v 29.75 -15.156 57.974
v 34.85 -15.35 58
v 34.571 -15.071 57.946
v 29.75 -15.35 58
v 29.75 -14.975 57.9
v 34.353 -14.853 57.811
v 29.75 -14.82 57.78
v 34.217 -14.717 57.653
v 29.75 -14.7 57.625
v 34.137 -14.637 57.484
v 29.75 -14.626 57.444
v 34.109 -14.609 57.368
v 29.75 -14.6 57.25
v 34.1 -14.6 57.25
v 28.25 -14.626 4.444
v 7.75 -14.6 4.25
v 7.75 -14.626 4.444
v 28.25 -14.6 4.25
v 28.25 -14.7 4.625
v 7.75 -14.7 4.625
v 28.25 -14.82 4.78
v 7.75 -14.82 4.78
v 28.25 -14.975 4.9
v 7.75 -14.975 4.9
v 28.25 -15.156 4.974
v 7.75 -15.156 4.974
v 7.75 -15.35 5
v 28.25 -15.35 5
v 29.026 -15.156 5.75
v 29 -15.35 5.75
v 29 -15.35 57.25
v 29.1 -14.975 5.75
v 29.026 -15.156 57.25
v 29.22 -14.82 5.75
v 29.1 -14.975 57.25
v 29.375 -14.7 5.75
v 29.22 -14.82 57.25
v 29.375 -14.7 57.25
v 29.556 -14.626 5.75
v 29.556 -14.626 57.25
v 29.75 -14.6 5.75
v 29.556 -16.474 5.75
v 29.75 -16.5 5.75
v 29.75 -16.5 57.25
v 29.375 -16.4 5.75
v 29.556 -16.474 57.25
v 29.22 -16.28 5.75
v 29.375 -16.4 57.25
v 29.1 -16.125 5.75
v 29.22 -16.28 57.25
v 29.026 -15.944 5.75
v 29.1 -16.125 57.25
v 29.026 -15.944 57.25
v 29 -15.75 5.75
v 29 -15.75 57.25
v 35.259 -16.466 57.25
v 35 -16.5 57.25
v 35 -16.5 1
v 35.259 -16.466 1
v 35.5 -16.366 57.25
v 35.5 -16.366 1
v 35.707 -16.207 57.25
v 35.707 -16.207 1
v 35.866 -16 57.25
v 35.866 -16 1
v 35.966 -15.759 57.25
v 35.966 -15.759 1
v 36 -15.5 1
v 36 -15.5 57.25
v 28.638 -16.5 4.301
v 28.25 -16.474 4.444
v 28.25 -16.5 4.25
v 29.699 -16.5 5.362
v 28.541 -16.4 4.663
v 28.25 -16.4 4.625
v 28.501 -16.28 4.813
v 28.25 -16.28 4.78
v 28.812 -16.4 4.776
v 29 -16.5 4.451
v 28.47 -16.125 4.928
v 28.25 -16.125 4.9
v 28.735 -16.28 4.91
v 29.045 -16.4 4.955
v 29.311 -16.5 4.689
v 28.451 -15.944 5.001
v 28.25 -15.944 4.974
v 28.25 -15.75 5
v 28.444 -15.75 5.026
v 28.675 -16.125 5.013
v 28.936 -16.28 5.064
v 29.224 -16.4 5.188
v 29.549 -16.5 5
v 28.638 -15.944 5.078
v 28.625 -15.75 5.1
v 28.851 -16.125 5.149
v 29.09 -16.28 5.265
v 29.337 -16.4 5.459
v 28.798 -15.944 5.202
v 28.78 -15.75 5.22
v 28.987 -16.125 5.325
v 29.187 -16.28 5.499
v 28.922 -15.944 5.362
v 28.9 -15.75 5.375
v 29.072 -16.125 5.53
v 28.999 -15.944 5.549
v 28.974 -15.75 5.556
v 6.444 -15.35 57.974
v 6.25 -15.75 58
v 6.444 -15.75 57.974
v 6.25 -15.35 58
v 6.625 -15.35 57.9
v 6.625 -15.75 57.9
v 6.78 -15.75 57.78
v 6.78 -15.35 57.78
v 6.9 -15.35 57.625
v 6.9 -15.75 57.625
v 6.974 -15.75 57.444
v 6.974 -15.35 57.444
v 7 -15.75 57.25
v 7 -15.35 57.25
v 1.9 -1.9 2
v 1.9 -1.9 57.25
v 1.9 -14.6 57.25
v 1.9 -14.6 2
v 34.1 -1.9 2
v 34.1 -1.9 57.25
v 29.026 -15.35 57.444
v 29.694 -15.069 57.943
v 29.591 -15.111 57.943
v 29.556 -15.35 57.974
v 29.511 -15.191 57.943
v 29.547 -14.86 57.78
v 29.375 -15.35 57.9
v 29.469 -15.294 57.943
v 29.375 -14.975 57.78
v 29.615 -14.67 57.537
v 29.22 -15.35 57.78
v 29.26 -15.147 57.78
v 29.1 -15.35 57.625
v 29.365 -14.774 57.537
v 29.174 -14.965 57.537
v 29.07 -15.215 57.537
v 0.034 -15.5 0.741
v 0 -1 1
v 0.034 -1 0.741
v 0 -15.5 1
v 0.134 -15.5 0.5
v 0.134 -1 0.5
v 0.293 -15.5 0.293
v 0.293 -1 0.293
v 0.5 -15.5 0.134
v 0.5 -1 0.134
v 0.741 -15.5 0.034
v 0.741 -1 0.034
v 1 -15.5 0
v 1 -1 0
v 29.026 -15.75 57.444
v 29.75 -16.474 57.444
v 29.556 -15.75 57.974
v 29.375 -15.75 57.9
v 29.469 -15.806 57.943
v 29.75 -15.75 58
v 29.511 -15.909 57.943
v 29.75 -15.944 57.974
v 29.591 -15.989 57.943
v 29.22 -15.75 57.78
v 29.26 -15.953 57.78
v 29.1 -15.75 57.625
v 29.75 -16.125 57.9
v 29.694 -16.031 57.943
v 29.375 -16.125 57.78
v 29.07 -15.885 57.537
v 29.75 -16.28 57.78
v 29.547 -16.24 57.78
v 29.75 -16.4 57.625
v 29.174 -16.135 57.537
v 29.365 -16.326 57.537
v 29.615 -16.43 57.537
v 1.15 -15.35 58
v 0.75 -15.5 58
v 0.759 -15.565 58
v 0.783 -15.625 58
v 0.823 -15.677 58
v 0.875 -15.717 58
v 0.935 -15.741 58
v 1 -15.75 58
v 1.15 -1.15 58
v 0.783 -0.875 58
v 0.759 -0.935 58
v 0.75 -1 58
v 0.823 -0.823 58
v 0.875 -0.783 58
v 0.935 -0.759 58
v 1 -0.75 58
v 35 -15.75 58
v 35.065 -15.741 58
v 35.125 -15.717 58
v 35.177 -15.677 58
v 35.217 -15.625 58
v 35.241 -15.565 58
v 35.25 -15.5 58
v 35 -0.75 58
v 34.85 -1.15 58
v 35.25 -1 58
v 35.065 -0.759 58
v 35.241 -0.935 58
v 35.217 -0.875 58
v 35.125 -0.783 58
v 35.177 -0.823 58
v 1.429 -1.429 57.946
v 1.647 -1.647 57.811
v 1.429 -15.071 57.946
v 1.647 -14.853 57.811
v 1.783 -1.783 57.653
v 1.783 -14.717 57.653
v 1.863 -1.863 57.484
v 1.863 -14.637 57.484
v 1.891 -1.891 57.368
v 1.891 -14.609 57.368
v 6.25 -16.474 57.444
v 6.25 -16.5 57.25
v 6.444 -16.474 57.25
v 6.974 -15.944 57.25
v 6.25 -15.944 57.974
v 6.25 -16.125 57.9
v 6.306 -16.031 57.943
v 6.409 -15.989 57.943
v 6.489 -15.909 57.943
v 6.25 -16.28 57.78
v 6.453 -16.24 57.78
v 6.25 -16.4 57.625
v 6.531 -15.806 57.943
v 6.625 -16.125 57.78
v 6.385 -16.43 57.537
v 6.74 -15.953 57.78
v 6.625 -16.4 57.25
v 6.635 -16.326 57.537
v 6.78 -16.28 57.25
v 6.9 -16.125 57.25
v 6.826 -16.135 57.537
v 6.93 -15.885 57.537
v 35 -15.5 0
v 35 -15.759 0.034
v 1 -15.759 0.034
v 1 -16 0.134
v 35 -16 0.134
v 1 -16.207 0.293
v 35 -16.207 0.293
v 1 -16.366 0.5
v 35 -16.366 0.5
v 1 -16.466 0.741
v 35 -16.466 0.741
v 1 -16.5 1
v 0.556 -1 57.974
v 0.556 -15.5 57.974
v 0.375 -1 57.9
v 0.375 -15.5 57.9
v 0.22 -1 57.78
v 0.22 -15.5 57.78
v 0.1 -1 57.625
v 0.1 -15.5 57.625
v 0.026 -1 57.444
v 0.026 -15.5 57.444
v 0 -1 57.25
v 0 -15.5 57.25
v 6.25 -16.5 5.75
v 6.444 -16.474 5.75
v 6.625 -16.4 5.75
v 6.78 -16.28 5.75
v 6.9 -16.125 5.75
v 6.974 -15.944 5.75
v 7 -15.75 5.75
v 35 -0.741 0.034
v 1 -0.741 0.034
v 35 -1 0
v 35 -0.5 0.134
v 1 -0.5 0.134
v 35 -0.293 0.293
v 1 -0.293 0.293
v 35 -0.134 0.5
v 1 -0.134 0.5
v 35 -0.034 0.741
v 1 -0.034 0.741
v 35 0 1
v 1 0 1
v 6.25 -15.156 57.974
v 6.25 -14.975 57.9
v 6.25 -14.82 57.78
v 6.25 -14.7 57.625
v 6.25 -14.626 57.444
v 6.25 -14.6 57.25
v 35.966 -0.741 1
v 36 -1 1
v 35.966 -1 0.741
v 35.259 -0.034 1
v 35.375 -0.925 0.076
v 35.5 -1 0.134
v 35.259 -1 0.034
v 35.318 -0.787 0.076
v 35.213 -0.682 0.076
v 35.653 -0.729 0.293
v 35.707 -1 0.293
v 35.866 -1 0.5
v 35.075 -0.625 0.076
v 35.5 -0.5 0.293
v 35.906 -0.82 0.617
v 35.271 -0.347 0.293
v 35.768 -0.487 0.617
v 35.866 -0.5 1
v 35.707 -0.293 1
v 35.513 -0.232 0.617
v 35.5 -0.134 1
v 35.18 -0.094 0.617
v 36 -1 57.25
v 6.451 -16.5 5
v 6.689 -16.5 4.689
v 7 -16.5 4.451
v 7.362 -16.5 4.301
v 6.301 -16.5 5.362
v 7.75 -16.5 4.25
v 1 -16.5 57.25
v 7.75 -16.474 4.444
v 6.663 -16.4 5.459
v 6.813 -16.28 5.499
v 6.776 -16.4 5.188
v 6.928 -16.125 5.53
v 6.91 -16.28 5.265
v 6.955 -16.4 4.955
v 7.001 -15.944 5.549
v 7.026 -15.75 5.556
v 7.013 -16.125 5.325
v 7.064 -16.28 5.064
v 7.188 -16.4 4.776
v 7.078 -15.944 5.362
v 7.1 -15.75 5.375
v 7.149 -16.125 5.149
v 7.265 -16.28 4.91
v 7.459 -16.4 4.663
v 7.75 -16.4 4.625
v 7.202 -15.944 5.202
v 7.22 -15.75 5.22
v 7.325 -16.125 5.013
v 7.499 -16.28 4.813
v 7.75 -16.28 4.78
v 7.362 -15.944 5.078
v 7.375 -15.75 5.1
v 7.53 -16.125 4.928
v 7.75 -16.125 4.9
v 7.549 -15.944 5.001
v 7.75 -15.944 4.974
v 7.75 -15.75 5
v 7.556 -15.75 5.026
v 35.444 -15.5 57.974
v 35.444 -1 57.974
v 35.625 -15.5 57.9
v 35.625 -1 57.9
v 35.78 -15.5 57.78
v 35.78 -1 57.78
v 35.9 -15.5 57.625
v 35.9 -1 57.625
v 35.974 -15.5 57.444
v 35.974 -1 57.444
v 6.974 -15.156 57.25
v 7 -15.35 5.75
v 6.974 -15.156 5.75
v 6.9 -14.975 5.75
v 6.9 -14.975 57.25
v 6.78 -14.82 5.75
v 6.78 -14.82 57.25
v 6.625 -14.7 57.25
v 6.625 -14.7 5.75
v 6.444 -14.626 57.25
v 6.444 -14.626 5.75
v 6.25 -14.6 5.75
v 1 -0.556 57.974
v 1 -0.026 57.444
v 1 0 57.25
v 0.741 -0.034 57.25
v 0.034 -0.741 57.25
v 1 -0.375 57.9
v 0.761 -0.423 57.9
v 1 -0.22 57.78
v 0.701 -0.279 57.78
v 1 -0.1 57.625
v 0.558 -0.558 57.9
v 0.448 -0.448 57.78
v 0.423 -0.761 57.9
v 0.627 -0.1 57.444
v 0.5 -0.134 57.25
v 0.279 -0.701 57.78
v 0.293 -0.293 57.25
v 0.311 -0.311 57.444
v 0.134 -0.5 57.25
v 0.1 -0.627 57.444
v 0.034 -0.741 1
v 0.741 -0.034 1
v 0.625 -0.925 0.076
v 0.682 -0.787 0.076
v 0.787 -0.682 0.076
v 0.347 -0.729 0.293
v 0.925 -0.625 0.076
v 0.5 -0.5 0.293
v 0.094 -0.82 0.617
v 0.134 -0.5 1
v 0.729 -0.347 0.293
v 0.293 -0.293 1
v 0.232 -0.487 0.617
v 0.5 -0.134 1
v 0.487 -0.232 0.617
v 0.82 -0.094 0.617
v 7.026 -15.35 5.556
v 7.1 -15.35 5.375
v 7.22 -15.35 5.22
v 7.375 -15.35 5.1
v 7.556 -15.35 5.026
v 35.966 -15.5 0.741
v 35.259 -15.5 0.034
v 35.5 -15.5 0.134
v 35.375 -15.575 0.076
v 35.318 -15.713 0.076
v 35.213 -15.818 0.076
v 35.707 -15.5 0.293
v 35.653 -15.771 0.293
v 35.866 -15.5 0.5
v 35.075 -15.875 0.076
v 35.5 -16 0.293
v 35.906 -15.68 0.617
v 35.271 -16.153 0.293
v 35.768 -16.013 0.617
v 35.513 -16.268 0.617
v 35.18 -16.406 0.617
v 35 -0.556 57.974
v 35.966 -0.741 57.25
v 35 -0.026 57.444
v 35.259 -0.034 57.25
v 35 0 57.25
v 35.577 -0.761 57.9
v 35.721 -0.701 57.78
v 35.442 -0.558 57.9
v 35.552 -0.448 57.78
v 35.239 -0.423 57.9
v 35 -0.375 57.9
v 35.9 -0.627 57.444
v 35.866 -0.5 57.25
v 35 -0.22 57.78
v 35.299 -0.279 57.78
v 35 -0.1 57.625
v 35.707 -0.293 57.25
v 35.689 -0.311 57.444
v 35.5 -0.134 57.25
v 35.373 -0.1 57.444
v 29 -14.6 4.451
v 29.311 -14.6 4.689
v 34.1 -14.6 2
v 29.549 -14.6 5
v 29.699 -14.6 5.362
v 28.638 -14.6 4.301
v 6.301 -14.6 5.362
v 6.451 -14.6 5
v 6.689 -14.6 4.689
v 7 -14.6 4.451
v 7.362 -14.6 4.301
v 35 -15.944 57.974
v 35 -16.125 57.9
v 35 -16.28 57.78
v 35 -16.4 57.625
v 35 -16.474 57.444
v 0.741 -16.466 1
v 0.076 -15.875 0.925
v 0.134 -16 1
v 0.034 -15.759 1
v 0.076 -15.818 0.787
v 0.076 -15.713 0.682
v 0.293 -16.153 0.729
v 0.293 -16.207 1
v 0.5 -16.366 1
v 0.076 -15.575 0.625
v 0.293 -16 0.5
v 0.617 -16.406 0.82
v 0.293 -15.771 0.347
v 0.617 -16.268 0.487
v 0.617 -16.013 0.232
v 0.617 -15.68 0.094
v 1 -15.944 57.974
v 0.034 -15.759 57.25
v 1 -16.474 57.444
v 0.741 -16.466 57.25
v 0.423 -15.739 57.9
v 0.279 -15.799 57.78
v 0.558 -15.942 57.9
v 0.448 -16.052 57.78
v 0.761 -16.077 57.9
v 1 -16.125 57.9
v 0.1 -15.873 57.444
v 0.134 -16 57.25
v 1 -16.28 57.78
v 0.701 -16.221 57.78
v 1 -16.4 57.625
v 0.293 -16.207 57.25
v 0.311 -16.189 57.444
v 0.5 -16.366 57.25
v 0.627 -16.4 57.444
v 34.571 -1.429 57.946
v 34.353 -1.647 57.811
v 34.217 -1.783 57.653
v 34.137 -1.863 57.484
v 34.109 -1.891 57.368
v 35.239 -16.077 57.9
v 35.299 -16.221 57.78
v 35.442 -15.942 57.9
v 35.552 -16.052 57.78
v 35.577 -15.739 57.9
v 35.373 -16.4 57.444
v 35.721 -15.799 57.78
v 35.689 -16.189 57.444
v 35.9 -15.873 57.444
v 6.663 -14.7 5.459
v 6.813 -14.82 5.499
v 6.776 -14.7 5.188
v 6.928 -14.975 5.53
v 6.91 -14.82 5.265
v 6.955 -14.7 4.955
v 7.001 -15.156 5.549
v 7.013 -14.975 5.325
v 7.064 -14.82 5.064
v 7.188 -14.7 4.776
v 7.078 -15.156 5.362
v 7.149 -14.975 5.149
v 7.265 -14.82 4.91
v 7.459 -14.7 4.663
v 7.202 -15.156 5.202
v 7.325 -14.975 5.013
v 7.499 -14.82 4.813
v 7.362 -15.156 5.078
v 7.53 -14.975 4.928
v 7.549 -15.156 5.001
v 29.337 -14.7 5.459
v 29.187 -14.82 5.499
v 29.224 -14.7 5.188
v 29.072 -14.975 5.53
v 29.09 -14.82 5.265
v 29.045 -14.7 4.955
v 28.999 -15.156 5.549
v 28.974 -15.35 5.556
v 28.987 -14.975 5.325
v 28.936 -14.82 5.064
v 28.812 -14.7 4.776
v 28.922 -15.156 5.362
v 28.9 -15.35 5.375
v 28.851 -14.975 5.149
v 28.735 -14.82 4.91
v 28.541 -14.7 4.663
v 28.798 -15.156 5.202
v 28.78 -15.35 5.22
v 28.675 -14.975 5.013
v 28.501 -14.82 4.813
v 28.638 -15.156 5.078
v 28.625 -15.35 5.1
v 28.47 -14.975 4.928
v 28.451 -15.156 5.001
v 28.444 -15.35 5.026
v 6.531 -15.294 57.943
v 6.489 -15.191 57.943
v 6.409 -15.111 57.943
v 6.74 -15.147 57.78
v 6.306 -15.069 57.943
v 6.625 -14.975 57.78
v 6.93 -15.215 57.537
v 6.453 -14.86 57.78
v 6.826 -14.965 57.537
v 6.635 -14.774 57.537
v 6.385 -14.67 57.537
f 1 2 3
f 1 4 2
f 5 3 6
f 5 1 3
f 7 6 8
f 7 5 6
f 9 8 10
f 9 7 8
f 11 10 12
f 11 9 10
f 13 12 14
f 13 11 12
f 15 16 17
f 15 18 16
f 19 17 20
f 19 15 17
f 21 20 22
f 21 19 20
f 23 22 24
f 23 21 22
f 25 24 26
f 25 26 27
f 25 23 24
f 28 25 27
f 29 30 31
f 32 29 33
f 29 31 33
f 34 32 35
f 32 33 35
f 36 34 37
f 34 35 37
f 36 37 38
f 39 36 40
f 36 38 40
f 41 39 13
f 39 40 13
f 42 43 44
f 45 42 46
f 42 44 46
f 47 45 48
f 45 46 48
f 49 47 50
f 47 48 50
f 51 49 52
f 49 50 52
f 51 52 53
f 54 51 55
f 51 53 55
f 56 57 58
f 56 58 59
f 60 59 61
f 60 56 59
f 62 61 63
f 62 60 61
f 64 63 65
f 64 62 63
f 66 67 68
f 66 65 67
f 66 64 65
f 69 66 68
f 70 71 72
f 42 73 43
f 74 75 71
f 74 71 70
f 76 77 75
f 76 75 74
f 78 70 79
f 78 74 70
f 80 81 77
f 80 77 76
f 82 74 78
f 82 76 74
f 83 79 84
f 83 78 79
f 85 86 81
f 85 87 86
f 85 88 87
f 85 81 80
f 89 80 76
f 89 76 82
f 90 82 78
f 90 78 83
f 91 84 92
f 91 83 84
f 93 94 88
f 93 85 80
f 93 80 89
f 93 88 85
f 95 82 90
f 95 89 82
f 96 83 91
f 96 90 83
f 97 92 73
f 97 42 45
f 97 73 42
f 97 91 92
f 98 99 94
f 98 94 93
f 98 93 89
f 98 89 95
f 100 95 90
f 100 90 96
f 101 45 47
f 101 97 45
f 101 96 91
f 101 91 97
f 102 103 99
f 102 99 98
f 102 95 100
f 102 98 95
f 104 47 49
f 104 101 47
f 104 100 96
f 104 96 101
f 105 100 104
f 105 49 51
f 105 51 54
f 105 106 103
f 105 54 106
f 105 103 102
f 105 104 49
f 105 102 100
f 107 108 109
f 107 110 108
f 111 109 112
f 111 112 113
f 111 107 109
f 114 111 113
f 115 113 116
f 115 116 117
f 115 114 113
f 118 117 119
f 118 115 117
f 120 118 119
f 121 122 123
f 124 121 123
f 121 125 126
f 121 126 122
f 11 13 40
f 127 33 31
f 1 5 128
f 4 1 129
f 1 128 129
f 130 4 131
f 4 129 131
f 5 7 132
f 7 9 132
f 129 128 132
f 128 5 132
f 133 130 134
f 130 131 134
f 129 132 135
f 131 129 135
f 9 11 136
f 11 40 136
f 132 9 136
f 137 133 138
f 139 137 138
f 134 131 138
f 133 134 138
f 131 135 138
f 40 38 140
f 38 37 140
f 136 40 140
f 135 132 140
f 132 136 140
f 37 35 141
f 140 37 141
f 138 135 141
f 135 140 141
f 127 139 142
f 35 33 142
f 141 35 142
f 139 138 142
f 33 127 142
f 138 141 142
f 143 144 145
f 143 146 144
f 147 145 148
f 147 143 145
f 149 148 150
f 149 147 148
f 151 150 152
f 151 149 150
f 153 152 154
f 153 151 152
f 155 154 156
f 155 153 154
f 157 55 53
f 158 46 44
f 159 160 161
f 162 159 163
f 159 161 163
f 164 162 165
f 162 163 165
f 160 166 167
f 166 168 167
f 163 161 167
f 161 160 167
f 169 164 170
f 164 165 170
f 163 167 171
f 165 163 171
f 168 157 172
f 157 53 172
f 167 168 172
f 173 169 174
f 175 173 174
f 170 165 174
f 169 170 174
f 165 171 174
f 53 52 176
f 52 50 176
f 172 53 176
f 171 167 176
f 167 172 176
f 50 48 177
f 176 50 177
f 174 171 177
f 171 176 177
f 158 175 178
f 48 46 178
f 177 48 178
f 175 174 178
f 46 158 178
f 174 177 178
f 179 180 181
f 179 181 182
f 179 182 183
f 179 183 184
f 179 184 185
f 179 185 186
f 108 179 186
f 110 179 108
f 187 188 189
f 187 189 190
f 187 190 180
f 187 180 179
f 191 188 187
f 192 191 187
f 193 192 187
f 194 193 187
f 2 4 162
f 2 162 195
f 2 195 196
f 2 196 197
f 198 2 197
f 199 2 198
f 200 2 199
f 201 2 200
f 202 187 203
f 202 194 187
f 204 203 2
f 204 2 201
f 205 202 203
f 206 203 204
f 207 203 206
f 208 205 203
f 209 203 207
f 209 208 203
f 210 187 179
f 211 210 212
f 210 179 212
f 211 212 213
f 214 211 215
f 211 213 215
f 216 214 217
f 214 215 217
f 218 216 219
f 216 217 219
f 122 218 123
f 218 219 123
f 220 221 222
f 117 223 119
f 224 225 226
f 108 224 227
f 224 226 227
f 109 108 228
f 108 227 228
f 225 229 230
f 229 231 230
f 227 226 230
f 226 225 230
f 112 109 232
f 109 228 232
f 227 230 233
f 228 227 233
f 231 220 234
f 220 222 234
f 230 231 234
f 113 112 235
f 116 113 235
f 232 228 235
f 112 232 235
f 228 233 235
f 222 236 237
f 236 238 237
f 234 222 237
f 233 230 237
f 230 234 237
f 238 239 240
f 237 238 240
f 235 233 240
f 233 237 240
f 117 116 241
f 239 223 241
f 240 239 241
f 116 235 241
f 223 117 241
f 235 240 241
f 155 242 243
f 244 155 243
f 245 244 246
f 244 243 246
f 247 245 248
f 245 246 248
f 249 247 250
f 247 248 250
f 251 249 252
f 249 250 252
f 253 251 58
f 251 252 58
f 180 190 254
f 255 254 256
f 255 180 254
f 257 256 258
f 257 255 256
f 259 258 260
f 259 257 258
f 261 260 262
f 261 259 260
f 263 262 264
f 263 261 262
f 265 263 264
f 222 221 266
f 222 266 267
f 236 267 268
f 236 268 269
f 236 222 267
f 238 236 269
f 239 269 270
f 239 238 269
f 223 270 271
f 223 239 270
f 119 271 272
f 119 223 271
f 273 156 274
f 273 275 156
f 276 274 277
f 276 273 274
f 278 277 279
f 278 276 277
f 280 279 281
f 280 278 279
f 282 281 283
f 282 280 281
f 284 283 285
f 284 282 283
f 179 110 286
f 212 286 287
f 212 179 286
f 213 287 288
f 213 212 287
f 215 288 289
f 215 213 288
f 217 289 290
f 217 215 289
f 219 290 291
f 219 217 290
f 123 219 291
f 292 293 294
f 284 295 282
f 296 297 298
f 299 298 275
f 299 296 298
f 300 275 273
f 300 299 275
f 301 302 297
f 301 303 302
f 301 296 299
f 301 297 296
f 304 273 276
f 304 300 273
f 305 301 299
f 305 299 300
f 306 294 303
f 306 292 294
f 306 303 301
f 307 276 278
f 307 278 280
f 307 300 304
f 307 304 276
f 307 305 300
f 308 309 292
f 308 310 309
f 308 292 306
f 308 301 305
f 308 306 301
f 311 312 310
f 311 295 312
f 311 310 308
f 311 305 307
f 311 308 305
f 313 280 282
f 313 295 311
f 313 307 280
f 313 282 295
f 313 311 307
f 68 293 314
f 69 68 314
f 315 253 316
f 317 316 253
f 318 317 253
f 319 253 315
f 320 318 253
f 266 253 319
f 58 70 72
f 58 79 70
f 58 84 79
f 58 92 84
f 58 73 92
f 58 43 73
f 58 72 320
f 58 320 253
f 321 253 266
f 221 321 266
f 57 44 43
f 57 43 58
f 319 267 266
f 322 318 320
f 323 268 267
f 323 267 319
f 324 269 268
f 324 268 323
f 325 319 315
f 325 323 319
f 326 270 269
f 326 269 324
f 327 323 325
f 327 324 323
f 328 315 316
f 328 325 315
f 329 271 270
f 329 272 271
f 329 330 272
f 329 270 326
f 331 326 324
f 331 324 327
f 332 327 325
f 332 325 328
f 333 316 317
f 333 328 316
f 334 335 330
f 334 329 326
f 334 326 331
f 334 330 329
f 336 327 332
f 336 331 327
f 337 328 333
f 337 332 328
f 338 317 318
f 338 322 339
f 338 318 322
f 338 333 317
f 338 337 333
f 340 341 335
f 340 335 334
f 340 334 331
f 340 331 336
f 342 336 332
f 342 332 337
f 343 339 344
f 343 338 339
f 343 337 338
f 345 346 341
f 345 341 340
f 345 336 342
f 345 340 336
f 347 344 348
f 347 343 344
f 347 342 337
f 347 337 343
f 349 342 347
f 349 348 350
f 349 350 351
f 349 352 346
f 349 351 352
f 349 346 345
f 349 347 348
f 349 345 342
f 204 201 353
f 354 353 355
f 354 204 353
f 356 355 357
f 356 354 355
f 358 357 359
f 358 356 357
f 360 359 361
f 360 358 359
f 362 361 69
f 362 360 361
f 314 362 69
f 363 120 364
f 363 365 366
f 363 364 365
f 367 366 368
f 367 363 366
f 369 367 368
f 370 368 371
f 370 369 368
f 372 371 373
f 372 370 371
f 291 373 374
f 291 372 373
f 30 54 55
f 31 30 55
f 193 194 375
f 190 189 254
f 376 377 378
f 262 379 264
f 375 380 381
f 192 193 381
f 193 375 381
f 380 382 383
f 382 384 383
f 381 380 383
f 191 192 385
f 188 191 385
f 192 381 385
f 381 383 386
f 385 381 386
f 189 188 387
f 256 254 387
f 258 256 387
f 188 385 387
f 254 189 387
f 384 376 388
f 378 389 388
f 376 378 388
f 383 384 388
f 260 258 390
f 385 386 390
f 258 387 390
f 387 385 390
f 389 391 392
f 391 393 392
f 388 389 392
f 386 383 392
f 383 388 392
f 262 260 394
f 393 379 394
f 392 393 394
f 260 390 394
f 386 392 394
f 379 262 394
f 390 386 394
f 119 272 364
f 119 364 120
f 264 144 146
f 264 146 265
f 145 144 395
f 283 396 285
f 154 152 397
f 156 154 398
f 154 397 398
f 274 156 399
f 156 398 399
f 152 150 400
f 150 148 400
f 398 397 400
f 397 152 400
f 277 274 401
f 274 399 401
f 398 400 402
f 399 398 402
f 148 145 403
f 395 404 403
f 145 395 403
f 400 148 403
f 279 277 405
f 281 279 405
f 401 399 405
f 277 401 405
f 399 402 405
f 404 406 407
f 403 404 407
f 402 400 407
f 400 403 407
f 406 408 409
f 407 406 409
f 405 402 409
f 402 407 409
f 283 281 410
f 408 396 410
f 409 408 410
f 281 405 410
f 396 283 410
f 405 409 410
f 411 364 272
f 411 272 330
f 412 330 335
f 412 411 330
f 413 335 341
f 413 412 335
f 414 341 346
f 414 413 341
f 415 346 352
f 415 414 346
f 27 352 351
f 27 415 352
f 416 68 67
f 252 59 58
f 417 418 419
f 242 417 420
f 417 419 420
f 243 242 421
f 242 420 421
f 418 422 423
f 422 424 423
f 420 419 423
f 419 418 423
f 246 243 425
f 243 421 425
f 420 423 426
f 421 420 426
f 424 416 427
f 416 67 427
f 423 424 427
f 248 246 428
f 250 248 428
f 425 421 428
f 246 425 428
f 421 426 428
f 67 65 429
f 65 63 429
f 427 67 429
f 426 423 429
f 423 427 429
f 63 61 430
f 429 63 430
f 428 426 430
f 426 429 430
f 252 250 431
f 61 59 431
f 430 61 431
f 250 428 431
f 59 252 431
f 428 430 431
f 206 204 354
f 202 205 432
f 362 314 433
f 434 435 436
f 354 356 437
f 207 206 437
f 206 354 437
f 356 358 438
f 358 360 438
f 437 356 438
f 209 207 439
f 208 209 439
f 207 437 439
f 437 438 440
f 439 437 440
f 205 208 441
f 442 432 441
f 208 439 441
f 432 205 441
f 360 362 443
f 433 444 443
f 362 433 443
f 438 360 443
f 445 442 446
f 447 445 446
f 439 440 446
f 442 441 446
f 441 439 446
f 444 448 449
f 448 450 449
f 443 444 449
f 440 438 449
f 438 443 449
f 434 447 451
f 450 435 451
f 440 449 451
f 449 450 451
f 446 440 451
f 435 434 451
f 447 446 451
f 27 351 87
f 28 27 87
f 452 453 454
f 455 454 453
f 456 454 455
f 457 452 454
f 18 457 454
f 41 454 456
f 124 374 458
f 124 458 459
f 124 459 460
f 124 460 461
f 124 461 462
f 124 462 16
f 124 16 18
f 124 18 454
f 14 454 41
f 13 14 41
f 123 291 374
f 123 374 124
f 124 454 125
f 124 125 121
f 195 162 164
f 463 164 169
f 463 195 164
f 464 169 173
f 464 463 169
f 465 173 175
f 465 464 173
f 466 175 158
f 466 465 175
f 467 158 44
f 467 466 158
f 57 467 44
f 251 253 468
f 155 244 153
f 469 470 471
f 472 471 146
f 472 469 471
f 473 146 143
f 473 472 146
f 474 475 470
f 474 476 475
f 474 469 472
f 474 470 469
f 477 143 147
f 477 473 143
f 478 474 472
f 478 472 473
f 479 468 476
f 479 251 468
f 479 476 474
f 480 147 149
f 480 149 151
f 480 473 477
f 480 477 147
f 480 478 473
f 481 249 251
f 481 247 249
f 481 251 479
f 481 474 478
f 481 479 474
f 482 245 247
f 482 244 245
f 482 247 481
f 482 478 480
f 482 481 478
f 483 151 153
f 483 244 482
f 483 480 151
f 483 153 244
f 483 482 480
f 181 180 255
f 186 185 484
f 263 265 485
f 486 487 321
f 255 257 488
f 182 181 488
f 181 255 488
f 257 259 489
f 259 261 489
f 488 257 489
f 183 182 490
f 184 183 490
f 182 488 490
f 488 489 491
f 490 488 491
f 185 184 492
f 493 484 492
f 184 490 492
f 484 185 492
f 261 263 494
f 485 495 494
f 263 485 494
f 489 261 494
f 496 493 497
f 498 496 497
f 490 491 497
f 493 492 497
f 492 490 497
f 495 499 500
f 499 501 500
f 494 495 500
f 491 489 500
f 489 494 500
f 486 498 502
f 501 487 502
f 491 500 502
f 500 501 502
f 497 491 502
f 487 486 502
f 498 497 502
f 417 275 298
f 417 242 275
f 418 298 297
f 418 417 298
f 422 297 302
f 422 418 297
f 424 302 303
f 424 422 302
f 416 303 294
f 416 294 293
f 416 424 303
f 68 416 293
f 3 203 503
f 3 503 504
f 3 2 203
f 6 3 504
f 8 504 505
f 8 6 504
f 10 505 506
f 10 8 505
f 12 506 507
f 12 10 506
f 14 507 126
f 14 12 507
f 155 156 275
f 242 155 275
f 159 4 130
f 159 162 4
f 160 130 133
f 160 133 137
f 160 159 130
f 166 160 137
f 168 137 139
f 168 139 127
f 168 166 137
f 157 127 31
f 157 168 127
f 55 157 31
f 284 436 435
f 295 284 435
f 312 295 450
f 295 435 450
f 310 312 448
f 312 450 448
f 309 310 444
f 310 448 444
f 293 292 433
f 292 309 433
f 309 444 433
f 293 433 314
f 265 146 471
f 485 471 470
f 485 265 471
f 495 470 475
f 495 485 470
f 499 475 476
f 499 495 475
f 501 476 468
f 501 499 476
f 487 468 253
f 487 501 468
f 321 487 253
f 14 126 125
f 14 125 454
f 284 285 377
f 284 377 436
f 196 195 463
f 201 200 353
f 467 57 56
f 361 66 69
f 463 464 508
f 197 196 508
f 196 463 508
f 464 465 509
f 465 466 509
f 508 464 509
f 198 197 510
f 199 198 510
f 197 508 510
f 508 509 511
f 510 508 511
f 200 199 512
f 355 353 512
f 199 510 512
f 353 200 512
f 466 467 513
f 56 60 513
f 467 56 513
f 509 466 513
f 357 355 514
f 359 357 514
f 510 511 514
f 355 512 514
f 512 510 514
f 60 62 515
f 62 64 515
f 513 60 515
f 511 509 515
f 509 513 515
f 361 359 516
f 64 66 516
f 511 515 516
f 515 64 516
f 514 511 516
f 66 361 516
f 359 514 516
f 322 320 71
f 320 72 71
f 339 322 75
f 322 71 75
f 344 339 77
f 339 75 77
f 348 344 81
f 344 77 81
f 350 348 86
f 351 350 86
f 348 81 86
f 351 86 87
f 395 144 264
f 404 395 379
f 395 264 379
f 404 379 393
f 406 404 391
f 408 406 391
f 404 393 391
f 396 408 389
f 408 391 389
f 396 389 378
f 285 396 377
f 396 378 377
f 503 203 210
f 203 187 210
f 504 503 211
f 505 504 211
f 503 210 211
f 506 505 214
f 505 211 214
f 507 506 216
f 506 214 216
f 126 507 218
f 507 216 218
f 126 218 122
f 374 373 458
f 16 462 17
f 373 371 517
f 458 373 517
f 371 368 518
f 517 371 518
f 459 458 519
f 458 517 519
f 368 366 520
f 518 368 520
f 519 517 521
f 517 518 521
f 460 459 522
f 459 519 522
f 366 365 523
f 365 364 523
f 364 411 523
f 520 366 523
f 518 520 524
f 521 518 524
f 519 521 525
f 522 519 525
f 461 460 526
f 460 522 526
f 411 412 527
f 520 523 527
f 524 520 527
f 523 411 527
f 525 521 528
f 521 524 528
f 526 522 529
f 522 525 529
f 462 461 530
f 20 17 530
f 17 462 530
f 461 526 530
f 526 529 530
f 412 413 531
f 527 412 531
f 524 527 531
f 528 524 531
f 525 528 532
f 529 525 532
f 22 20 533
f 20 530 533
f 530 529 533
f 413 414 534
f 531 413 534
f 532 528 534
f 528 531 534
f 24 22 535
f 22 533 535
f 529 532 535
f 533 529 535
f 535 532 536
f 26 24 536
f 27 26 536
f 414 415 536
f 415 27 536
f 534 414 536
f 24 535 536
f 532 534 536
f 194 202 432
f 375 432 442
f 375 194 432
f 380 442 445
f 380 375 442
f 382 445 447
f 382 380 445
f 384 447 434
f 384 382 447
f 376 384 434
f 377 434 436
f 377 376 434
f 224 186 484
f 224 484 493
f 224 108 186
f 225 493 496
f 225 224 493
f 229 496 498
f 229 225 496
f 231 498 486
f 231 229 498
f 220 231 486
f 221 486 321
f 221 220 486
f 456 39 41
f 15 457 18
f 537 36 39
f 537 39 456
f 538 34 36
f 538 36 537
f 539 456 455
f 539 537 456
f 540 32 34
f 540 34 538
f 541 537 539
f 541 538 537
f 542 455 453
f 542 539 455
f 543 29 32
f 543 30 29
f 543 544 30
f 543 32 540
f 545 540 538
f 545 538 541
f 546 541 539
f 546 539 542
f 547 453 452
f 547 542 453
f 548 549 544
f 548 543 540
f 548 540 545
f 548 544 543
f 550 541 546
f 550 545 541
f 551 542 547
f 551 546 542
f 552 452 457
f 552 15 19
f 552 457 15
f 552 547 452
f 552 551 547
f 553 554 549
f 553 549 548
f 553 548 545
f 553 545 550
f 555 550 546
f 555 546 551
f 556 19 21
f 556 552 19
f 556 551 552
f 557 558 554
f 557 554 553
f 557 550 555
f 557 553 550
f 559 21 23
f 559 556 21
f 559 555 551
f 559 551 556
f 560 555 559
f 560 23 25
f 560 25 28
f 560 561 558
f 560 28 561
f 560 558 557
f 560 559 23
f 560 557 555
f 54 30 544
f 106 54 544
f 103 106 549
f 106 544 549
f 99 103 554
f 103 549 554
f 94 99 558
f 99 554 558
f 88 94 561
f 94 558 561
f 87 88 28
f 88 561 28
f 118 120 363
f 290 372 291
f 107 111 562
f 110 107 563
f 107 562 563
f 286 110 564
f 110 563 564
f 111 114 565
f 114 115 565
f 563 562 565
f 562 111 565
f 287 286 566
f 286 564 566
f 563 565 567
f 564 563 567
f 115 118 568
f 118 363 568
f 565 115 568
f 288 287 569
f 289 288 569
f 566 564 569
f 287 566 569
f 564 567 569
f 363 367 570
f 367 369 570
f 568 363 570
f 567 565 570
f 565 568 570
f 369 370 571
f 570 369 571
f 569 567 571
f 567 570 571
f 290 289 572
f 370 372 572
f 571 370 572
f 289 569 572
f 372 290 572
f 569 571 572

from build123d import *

# Parameters (mm, degrees)
SKETCH_W        = 36
SKETCH_H        = 58
PAD_DEPTH       = 16.5
SKETCH001_W     = 22
SKETCH001_H     = 53
POCKET_DEPTH    = 5
SKETCH002_W     = 32.2
SKETCH002_H     = 12.7
POCKET001_DEPTH = 56
FILLET_R        = 1
FILLET001_R     = 0.75
FILLET002_R     = 0.75


with BuildPart() as part:
    # Sketch → Pad (new body)
    with BuildSketch(Plane.XZ):
        with Locations((18, 29)):
            Rectangle(SKETCH_W, SKETCH_H)
    extrude(amount=PAD_DEPTH)

    # Sketch001 (on Face6 of Pad) → Pocket (cut)
    with BuildSketch(Plane.XZ.offset(16.5)):
        with Locations((18, 31.5)):
            Rectangle(SKETCH001_W, SKETCH001_H)
    extrude(amount=-POCKET_DEPTH, mode=Mode.SUBTRACT)

    # Sketch002 (on Face6 of Pocket) → Pocket001 (cut)
    with BuildSketch(Plane(origin=(0, 0, 58), x_dir=(-1, 0, 0), z_dir=(0, 0, 1))):
        with Locations((-18, 8.25)):
            Rectangle(SKETCH002_W, SKETCH002_H)
    extrude(amount=-POCKET001_DEPTH, mode=Mode.SUBTRACT)

    # Fillet
    fillet_edges = [part.edges().sort_by_distance(p)[0] for p in [
        (36, -16.5, 29),
        (36, 0, 29),
        (36, -8.25, 0),
        (18, -16.5, 0),
        (0, -16.5, 29),
        (0, 0, 29),
        (0, -8.25, 0),
        (18, 0, 0),
    ]]
    fillet(fillet_edges, radius=FILLET_R)

    # Fillet001
    fillet001_edges = [part.edges().sort_by_distance(p)[0] for p in [
        (18, -16.5, 5),
        (7, -15.55, 5),
        (29, -16.5, 31.5),
        (29, -15.55, 5),
        (7, -14.6, 31.5),
        (7, -16.5, 31.5),
        (29, -14.6, 31.5),
        (18, -14.6, 5),
    ]]
    fillet(fillet001_edges, radius=FILLET001_R)

    # Fillet002
    fillet002_edges = [part.edges().sort_by_distance(p)[0] for p in [
        (32.375, -16.5, 58),
        (1.9, -8.25, 58),
        (0.292893, -0.292893, 58),
        (34.1, -8.25, 58),
        (35.707107, -0.292893, 58),
        (18, -1.9, 58),
        (31.925, -14.6, 58),
        (35.707107, -16.207107, 58),
        (29.21967, -14.81967, 58),
        (6.68934, -16.5, 4.68934),
        (29.21967, -16.28033, 58),
        (6.78033, -14.81967, 58),
        (18, 0, 58),
        (0, -8.25, 58),
        (3.625, -16.5, 58),
        (36, -8.25, 58),
    ]]
    fillet(fillet002_edges, radius=FILLET002_R)


solid = part.part
